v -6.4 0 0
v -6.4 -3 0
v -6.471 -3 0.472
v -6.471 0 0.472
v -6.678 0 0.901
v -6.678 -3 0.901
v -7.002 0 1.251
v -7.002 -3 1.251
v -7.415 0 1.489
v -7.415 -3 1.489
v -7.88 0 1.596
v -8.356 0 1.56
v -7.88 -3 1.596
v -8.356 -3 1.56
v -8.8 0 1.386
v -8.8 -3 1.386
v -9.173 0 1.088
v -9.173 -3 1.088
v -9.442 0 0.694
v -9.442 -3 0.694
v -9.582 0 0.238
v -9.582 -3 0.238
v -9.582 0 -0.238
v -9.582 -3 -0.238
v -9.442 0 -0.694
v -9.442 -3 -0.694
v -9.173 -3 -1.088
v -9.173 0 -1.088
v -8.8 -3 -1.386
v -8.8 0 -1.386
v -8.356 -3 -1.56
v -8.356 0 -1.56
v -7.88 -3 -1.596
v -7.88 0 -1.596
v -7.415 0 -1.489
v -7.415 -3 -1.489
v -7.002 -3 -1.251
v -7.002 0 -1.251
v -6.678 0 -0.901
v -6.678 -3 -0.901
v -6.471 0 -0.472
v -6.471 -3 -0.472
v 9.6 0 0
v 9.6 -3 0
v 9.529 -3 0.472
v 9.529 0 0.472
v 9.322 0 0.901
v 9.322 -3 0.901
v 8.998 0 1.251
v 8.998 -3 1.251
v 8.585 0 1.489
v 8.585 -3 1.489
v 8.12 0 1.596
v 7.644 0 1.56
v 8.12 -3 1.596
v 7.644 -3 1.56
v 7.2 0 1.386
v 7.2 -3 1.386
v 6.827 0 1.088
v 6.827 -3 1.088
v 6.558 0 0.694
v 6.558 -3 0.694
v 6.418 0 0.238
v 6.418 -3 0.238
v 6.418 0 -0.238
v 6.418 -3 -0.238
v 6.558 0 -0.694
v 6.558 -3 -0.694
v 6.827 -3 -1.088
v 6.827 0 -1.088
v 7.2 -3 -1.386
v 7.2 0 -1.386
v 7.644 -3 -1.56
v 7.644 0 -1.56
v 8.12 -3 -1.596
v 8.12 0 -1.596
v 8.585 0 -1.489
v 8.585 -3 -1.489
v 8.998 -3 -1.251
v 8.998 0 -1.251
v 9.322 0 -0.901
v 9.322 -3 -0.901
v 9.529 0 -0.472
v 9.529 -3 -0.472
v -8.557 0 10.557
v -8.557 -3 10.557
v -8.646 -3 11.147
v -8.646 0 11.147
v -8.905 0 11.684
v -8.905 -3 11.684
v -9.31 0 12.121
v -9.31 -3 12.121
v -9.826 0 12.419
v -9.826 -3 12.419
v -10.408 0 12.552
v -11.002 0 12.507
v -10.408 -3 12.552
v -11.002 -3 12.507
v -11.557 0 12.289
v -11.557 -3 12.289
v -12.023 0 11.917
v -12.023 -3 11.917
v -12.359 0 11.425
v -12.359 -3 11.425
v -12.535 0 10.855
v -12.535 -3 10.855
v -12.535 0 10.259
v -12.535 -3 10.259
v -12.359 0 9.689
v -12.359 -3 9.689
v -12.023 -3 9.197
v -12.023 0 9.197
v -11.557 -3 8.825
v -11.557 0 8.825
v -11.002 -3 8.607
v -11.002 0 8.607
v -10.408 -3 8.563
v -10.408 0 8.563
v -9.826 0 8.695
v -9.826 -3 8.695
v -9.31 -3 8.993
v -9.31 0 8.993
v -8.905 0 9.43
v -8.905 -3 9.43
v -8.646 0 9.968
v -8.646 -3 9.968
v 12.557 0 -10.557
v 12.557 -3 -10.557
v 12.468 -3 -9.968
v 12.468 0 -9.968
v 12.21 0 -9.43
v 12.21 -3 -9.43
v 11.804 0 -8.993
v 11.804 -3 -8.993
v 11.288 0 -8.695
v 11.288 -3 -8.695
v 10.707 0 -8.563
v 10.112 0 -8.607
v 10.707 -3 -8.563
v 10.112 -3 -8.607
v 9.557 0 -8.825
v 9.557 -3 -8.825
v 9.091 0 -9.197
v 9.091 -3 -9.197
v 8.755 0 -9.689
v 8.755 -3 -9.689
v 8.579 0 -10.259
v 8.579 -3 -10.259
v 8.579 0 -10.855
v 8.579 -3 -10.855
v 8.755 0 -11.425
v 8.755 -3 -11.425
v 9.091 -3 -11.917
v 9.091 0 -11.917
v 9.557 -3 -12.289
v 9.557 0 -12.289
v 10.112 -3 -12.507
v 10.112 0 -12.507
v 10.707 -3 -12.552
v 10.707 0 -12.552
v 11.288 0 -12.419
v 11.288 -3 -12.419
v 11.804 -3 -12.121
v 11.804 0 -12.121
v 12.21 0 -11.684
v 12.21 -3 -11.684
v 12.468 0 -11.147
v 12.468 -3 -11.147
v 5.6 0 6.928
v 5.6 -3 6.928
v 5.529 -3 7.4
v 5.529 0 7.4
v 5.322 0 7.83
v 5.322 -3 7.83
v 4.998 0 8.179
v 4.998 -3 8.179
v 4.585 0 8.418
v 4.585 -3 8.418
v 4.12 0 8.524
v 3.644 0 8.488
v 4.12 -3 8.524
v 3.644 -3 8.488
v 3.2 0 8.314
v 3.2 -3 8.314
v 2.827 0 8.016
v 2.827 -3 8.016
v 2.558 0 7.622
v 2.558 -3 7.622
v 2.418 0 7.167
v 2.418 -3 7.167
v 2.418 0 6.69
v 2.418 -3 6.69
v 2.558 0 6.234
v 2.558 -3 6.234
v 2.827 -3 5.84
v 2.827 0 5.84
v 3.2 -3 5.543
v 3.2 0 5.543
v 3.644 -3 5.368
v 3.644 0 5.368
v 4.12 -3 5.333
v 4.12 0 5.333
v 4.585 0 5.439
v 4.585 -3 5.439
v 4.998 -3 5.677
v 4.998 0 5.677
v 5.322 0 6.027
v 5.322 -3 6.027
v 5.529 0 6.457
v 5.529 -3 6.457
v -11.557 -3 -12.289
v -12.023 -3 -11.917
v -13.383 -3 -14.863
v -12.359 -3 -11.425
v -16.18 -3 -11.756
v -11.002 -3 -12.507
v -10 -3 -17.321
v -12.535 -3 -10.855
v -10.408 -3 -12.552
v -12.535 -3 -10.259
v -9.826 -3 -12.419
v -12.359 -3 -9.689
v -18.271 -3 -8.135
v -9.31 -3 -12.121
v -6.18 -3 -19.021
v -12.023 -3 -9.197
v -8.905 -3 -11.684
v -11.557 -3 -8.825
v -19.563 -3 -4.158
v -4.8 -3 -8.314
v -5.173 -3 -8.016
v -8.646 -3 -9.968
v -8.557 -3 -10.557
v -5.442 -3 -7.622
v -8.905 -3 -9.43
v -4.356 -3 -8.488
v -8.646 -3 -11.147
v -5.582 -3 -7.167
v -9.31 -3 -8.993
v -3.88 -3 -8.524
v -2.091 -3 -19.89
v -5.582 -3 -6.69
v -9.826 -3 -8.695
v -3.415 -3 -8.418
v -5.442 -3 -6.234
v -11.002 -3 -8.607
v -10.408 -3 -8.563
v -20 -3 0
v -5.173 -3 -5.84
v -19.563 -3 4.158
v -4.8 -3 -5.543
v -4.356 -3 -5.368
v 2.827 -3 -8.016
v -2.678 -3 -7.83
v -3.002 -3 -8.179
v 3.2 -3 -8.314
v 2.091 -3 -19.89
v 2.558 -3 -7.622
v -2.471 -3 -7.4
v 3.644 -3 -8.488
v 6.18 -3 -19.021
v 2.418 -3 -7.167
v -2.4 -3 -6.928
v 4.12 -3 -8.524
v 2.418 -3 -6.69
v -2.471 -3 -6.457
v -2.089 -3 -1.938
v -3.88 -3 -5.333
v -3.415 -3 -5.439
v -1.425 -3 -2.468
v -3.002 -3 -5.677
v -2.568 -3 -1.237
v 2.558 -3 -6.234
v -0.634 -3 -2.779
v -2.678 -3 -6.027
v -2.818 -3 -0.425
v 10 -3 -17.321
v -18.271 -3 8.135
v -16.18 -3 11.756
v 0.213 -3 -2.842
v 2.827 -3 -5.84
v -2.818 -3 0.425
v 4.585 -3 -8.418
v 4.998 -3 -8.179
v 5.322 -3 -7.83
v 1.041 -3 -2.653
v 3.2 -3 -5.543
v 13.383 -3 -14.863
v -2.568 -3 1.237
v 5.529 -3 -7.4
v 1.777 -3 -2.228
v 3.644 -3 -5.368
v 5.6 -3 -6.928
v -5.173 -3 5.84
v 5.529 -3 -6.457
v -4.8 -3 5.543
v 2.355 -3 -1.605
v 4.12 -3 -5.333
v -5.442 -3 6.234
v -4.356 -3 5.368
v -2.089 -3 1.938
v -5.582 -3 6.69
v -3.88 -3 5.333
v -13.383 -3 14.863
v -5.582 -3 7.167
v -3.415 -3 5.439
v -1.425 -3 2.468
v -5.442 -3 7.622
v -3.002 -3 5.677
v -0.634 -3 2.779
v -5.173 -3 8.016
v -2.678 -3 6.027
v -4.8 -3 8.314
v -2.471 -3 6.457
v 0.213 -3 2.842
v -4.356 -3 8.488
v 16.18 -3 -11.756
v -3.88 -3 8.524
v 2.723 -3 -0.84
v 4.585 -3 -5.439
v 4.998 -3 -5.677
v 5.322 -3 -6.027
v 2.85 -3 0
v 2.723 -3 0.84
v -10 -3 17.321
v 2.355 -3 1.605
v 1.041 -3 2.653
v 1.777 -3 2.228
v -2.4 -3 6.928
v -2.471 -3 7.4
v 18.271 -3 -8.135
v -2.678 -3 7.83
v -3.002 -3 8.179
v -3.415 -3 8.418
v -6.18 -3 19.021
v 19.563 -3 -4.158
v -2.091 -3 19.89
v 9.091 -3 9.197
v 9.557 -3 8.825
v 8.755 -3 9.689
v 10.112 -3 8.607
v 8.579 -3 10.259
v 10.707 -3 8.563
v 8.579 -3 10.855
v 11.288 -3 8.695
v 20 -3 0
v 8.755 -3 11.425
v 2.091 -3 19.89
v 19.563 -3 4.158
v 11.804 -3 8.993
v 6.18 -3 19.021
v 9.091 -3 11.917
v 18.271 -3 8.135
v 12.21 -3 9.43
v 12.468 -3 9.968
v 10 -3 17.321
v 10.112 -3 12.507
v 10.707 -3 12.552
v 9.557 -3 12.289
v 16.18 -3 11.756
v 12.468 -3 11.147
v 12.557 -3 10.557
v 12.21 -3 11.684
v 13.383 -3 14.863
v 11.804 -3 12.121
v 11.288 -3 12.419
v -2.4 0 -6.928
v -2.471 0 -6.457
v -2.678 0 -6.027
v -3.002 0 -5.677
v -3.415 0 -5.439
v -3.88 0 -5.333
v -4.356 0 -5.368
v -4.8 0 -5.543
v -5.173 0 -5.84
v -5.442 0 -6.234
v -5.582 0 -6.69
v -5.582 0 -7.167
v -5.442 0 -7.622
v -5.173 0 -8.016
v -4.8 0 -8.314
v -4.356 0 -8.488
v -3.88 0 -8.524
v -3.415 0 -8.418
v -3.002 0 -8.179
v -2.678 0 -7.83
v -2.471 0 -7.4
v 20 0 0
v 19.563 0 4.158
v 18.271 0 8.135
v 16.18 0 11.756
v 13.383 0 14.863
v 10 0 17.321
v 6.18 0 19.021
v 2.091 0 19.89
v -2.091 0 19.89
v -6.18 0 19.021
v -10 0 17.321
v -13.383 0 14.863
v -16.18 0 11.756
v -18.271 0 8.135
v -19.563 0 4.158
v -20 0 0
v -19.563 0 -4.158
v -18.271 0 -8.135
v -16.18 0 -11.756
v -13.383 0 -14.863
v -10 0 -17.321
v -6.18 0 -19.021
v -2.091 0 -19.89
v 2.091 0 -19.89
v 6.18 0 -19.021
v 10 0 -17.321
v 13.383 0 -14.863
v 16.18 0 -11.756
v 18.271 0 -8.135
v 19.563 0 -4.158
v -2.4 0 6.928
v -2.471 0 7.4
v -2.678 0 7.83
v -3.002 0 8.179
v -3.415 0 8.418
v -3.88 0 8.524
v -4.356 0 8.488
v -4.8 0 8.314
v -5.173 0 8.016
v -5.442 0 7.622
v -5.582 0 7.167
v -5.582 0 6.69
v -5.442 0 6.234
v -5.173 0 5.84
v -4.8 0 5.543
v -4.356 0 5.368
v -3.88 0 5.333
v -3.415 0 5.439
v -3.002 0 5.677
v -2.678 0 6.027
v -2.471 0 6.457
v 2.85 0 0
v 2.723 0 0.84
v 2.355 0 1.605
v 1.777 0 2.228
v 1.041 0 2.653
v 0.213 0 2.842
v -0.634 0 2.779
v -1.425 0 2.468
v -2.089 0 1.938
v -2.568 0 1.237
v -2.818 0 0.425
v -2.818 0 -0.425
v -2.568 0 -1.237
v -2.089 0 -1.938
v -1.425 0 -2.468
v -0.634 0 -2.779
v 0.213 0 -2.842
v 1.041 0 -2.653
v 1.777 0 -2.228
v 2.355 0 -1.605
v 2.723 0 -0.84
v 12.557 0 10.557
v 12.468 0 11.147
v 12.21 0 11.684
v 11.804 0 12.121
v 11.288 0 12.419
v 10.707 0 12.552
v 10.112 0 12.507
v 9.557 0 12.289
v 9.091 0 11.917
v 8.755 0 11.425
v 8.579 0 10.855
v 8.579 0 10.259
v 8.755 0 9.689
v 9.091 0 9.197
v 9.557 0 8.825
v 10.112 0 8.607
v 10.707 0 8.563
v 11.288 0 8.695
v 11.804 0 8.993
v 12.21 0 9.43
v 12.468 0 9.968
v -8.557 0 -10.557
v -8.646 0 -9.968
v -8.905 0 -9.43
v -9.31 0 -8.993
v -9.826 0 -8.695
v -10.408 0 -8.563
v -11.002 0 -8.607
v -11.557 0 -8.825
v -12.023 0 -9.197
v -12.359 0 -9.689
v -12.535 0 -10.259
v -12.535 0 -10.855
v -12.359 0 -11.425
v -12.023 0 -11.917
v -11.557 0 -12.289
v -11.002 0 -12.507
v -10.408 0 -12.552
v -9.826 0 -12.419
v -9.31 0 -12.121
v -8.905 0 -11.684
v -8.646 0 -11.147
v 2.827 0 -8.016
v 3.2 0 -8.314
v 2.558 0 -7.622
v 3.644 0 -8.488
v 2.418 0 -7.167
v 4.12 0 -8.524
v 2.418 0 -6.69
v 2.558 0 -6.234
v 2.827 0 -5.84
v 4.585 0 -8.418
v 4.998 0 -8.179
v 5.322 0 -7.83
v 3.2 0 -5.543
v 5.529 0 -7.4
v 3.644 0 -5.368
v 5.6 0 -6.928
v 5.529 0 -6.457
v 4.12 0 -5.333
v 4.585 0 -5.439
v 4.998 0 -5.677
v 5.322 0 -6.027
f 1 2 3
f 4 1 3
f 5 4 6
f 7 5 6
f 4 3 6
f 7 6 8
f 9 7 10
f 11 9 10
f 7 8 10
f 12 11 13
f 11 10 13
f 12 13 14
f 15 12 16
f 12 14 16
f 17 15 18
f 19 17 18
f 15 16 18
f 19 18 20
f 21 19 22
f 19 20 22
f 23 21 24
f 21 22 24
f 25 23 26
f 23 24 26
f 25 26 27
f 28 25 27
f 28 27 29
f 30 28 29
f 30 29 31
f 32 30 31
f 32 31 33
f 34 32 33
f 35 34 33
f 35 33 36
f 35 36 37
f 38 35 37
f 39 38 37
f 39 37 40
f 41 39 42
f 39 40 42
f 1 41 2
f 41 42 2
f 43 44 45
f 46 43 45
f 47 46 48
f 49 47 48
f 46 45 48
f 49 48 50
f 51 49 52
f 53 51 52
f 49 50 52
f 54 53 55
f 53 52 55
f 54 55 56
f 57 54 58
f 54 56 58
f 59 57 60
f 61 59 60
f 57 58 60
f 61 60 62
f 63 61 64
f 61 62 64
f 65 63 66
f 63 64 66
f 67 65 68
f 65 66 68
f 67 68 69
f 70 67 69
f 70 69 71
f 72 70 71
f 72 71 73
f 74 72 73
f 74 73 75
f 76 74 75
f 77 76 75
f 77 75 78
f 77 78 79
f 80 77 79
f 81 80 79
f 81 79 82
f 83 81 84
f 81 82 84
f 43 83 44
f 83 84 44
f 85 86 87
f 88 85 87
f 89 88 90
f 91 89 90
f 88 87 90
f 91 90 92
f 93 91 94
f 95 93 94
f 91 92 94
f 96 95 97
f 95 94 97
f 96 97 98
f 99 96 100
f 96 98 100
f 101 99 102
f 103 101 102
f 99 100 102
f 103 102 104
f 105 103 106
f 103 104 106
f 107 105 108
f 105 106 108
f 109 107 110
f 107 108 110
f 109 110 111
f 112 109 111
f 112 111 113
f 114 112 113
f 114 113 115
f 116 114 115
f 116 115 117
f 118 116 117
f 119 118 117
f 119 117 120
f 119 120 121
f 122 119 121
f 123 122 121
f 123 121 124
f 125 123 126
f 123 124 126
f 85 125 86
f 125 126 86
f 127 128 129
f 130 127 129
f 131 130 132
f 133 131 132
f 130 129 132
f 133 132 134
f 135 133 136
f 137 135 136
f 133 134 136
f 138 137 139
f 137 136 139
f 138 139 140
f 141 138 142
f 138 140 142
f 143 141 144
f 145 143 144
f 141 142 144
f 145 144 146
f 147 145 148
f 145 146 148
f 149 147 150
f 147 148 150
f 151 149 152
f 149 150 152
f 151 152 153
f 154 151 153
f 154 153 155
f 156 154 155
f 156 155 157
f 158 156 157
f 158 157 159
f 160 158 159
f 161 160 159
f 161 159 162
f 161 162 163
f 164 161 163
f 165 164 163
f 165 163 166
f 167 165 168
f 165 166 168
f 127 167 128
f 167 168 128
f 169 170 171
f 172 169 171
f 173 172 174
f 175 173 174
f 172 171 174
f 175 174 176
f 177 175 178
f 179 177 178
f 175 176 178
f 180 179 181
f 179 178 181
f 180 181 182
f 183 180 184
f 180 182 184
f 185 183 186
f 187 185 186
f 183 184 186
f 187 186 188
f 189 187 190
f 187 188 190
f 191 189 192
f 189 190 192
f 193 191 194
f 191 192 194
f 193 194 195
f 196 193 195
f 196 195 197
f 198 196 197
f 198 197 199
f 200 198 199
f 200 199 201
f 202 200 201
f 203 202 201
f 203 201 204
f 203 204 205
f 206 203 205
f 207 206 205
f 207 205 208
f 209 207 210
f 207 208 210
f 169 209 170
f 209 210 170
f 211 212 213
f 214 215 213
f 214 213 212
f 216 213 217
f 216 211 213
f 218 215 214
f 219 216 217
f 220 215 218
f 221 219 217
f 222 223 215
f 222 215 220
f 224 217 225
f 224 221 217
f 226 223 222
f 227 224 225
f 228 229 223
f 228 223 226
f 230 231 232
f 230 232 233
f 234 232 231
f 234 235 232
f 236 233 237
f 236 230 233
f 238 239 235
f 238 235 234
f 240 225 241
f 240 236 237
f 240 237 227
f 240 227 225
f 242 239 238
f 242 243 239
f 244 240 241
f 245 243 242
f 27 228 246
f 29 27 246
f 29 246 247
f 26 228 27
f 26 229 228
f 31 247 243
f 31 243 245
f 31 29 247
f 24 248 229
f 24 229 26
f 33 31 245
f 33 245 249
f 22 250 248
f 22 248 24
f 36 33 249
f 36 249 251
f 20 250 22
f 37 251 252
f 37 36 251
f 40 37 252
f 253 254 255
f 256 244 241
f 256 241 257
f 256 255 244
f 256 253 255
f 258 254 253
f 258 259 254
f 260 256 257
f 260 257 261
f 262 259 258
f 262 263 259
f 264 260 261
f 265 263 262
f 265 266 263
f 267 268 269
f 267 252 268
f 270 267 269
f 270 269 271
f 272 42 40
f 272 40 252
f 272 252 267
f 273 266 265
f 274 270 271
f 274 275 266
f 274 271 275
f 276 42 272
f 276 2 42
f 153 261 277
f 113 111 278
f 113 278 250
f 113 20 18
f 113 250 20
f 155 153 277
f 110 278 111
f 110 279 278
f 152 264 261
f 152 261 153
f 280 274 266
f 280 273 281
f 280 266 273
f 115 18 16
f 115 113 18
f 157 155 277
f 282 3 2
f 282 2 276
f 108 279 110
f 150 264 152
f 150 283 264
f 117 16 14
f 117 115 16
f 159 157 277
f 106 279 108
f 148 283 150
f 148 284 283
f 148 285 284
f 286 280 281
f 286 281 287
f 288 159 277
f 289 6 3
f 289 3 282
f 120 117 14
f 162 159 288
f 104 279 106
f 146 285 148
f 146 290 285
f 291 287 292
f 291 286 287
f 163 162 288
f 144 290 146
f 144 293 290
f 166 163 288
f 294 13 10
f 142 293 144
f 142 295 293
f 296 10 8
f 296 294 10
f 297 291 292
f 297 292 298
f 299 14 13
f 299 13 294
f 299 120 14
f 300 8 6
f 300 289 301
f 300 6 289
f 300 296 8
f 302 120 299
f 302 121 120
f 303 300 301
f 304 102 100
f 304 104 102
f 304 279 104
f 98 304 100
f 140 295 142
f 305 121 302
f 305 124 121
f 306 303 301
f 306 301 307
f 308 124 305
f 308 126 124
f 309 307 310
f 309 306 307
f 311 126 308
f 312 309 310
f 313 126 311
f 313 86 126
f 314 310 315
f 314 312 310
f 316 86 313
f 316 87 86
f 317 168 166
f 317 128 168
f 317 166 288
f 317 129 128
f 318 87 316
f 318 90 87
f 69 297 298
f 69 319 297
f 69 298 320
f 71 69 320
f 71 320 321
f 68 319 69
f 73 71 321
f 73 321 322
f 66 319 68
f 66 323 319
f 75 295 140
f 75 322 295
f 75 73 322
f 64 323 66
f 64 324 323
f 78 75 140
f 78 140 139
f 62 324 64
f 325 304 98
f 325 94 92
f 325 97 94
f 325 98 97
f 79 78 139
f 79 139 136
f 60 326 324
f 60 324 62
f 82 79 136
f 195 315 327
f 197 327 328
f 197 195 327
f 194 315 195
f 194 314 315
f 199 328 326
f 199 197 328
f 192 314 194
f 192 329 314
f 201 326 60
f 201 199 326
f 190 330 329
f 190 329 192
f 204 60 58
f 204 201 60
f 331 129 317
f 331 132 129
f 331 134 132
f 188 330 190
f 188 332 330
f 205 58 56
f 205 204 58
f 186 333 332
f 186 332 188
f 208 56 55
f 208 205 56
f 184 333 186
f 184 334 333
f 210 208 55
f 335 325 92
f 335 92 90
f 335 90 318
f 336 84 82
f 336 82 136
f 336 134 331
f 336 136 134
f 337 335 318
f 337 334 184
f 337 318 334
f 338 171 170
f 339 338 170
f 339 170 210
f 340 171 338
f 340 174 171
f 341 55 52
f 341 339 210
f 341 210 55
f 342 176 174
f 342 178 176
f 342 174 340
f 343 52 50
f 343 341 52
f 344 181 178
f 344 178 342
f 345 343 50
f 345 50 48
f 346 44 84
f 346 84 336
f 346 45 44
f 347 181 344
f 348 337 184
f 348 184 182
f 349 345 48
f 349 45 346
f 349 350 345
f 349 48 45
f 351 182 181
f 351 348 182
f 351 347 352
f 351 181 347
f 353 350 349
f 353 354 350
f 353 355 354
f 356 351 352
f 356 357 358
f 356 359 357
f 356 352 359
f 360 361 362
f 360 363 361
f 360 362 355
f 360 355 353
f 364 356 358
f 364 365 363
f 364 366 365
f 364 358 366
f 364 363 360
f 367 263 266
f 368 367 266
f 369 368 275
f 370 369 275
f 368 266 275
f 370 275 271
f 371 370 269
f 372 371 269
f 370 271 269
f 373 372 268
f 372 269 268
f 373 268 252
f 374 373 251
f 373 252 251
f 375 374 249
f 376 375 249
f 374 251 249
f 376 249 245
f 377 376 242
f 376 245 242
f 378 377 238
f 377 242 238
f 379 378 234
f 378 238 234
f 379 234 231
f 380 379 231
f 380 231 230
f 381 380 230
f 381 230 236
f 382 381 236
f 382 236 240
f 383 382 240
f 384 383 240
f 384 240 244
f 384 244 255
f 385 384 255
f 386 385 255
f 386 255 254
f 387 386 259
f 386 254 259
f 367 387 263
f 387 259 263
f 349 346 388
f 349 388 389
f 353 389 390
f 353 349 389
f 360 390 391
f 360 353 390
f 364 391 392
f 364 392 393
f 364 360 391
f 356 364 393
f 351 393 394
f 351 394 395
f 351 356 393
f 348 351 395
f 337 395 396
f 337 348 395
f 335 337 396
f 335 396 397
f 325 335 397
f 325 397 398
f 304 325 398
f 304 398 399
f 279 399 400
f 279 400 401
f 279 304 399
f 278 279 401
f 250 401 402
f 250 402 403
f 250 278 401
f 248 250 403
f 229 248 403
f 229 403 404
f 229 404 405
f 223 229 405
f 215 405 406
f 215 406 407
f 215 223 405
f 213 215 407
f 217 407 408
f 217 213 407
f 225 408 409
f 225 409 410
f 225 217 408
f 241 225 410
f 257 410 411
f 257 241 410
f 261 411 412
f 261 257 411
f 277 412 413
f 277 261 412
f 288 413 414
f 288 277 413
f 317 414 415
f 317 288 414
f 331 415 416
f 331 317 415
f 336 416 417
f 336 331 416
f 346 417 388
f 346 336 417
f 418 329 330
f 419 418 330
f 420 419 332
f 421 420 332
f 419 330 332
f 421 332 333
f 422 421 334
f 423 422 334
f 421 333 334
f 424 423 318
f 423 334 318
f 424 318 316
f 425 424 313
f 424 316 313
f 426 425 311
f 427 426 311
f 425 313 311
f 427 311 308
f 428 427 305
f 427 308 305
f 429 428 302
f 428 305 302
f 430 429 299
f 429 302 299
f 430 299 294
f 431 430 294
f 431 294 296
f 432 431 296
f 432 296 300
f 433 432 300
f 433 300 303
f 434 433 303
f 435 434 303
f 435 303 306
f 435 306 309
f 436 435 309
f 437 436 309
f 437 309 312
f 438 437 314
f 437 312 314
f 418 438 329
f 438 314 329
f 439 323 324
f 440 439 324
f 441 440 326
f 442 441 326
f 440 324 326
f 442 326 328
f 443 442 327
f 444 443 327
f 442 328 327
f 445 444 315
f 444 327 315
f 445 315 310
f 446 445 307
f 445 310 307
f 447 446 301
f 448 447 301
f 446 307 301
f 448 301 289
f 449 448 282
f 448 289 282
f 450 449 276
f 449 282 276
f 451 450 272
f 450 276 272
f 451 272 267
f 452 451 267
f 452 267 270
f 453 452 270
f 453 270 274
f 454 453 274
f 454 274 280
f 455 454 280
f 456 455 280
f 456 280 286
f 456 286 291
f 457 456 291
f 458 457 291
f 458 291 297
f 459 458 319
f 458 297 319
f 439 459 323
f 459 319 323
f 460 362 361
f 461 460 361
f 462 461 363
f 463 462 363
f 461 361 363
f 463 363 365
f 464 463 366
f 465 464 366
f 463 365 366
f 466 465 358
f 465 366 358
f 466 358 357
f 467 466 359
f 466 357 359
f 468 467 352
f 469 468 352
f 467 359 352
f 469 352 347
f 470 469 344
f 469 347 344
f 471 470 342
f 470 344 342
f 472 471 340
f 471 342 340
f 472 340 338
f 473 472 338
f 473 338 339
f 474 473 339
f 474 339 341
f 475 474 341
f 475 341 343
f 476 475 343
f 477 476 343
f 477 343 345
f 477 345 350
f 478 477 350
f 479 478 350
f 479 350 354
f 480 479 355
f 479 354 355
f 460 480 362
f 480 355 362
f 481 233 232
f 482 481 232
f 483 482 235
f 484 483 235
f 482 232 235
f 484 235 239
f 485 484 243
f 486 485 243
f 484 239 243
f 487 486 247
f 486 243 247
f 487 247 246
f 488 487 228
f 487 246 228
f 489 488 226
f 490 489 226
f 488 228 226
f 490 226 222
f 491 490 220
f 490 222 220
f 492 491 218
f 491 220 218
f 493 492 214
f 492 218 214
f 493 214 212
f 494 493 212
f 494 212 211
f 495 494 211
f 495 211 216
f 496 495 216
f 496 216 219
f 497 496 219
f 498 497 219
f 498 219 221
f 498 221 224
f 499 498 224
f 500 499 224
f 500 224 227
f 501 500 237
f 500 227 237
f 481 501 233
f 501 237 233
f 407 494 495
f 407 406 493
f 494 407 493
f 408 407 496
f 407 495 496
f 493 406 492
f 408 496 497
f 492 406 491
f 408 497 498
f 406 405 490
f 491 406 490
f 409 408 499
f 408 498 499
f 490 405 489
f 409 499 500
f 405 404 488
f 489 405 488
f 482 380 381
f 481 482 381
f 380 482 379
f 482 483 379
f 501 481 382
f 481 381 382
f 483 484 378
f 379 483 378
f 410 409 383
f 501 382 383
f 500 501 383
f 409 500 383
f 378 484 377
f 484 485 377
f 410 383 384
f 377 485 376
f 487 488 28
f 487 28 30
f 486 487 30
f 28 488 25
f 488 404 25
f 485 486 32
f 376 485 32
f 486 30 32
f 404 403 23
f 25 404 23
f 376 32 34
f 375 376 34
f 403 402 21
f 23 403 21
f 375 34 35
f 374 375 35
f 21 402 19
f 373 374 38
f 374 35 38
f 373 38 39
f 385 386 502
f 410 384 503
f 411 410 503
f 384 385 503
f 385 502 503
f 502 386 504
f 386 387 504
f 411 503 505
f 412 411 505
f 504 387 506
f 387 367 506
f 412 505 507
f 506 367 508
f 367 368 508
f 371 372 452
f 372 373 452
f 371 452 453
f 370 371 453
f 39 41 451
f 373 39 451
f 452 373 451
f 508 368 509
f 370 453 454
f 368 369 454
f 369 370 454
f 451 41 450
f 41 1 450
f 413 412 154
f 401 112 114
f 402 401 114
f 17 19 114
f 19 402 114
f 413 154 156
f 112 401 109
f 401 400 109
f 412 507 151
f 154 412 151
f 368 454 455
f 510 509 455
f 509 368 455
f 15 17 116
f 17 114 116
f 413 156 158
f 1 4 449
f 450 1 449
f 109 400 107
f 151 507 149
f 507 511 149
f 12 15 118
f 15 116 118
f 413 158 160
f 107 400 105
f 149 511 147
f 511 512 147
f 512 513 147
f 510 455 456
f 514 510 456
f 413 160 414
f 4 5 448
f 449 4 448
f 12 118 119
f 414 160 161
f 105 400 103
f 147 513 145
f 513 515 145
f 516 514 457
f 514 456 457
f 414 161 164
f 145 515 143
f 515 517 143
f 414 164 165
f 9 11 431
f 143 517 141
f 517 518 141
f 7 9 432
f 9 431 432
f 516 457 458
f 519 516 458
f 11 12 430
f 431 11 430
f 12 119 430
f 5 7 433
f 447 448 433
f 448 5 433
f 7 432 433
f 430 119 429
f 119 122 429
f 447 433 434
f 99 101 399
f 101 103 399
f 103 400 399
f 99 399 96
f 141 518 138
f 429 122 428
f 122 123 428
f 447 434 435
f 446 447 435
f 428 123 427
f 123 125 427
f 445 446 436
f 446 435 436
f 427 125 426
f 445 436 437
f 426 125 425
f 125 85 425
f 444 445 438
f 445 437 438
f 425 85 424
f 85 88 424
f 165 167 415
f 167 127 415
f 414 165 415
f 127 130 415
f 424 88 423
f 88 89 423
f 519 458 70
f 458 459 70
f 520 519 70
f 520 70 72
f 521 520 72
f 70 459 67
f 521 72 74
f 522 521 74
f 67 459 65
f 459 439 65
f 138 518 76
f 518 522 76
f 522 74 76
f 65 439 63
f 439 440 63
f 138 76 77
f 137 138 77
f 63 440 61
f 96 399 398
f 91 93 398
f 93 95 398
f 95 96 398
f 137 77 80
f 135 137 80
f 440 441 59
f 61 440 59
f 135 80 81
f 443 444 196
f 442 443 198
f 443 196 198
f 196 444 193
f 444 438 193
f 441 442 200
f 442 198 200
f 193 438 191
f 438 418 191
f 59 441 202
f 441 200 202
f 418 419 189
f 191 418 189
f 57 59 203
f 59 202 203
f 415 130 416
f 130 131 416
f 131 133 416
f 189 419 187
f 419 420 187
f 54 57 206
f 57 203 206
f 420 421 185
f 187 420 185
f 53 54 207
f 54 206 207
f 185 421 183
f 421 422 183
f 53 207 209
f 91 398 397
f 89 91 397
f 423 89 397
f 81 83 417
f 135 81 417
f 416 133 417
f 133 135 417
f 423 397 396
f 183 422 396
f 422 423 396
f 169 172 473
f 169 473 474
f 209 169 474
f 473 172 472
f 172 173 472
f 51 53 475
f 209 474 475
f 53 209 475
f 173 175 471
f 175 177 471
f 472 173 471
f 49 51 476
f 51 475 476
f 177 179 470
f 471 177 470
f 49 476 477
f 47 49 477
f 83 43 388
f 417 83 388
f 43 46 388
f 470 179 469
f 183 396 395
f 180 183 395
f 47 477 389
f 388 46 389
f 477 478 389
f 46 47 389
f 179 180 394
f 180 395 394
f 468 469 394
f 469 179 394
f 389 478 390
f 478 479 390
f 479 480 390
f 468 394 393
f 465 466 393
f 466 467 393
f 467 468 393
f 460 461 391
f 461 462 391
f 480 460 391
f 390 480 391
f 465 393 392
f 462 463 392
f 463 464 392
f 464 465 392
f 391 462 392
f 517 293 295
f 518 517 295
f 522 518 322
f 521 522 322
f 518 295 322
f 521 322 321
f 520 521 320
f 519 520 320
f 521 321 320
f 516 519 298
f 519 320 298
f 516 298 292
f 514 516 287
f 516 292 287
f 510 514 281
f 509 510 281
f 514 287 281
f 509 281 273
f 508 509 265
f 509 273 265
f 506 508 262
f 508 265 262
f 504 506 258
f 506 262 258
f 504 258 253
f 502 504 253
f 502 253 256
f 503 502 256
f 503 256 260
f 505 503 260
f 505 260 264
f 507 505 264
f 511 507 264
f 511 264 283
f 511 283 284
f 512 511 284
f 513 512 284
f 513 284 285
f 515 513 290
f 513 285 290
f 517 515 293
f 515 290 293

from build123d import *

# Parameters (mm, degrees)
ESBO_O1_R                = 20
ESBO_O1_R_2              = 2.85
ESBO_O1_R_3              = 2
ESBO_O1_R_4              = 1.6
RESSALTO_EXTRUS_O1_DEPTH = 3


with BuildPart() as part:
    # Esboço1 → Ressalto-extrusão1 (new body)
    with BuildSketch(Plane.XZ.offset(3)):
        Circle(ESBO_O1_R)
        Circle(ESBO_O1_R_2, mode=Mode.SUBTRACT)
        with Locations((10.557104243, 10.557104243)):
            Circle(ESBO_O1_R_3, mode=Mode.SUBTRACT)
        with Locations((10.557104243, -10.557104243)):
            Circle(ESBO_O1_R_3, mode=Mode.SUBTRACT)
        with Locations((-10.557104243, -10.557104243)):
            Circle(ESBO_O1_R_3, mode=Mode.SUBTRACT)
        with Locations((-10.557104243, 10.557104243)):
            Circle(ESBO_O1_R_3, mode=Mode.SUBTRACT)
        with Locations((-8, 0)):
            Circle(ESBO_O1_R_4, mode=Mode.SUBTRACT)
        with Locations((-4, 6.92820323)):
            Circle(ESBO_O1_R_4, mode=Mode.SUBTRACT)
        with Locations((4, 6.92820323)):
            Circle(ESBO_O1_R_4, mode=Mode.SUBTRACT)
        with Locations((8, 0)):
            Circle(ESBO_O1_R_4, mode=Mode.SUBTRACT)
        with Locations((4, -6.92820323)):
            Circle(ESBO_O1_R_4, mode=Mode.SUBTRACT)
        with Locations((-4, -6.92820323)):
            Circle(ESBO_O1_R_4, mode=Mode.SUBTRACT)
    extrude(amount=-RESSALTO_EXTRUS_O1_DEPTH)


solid = part.part
